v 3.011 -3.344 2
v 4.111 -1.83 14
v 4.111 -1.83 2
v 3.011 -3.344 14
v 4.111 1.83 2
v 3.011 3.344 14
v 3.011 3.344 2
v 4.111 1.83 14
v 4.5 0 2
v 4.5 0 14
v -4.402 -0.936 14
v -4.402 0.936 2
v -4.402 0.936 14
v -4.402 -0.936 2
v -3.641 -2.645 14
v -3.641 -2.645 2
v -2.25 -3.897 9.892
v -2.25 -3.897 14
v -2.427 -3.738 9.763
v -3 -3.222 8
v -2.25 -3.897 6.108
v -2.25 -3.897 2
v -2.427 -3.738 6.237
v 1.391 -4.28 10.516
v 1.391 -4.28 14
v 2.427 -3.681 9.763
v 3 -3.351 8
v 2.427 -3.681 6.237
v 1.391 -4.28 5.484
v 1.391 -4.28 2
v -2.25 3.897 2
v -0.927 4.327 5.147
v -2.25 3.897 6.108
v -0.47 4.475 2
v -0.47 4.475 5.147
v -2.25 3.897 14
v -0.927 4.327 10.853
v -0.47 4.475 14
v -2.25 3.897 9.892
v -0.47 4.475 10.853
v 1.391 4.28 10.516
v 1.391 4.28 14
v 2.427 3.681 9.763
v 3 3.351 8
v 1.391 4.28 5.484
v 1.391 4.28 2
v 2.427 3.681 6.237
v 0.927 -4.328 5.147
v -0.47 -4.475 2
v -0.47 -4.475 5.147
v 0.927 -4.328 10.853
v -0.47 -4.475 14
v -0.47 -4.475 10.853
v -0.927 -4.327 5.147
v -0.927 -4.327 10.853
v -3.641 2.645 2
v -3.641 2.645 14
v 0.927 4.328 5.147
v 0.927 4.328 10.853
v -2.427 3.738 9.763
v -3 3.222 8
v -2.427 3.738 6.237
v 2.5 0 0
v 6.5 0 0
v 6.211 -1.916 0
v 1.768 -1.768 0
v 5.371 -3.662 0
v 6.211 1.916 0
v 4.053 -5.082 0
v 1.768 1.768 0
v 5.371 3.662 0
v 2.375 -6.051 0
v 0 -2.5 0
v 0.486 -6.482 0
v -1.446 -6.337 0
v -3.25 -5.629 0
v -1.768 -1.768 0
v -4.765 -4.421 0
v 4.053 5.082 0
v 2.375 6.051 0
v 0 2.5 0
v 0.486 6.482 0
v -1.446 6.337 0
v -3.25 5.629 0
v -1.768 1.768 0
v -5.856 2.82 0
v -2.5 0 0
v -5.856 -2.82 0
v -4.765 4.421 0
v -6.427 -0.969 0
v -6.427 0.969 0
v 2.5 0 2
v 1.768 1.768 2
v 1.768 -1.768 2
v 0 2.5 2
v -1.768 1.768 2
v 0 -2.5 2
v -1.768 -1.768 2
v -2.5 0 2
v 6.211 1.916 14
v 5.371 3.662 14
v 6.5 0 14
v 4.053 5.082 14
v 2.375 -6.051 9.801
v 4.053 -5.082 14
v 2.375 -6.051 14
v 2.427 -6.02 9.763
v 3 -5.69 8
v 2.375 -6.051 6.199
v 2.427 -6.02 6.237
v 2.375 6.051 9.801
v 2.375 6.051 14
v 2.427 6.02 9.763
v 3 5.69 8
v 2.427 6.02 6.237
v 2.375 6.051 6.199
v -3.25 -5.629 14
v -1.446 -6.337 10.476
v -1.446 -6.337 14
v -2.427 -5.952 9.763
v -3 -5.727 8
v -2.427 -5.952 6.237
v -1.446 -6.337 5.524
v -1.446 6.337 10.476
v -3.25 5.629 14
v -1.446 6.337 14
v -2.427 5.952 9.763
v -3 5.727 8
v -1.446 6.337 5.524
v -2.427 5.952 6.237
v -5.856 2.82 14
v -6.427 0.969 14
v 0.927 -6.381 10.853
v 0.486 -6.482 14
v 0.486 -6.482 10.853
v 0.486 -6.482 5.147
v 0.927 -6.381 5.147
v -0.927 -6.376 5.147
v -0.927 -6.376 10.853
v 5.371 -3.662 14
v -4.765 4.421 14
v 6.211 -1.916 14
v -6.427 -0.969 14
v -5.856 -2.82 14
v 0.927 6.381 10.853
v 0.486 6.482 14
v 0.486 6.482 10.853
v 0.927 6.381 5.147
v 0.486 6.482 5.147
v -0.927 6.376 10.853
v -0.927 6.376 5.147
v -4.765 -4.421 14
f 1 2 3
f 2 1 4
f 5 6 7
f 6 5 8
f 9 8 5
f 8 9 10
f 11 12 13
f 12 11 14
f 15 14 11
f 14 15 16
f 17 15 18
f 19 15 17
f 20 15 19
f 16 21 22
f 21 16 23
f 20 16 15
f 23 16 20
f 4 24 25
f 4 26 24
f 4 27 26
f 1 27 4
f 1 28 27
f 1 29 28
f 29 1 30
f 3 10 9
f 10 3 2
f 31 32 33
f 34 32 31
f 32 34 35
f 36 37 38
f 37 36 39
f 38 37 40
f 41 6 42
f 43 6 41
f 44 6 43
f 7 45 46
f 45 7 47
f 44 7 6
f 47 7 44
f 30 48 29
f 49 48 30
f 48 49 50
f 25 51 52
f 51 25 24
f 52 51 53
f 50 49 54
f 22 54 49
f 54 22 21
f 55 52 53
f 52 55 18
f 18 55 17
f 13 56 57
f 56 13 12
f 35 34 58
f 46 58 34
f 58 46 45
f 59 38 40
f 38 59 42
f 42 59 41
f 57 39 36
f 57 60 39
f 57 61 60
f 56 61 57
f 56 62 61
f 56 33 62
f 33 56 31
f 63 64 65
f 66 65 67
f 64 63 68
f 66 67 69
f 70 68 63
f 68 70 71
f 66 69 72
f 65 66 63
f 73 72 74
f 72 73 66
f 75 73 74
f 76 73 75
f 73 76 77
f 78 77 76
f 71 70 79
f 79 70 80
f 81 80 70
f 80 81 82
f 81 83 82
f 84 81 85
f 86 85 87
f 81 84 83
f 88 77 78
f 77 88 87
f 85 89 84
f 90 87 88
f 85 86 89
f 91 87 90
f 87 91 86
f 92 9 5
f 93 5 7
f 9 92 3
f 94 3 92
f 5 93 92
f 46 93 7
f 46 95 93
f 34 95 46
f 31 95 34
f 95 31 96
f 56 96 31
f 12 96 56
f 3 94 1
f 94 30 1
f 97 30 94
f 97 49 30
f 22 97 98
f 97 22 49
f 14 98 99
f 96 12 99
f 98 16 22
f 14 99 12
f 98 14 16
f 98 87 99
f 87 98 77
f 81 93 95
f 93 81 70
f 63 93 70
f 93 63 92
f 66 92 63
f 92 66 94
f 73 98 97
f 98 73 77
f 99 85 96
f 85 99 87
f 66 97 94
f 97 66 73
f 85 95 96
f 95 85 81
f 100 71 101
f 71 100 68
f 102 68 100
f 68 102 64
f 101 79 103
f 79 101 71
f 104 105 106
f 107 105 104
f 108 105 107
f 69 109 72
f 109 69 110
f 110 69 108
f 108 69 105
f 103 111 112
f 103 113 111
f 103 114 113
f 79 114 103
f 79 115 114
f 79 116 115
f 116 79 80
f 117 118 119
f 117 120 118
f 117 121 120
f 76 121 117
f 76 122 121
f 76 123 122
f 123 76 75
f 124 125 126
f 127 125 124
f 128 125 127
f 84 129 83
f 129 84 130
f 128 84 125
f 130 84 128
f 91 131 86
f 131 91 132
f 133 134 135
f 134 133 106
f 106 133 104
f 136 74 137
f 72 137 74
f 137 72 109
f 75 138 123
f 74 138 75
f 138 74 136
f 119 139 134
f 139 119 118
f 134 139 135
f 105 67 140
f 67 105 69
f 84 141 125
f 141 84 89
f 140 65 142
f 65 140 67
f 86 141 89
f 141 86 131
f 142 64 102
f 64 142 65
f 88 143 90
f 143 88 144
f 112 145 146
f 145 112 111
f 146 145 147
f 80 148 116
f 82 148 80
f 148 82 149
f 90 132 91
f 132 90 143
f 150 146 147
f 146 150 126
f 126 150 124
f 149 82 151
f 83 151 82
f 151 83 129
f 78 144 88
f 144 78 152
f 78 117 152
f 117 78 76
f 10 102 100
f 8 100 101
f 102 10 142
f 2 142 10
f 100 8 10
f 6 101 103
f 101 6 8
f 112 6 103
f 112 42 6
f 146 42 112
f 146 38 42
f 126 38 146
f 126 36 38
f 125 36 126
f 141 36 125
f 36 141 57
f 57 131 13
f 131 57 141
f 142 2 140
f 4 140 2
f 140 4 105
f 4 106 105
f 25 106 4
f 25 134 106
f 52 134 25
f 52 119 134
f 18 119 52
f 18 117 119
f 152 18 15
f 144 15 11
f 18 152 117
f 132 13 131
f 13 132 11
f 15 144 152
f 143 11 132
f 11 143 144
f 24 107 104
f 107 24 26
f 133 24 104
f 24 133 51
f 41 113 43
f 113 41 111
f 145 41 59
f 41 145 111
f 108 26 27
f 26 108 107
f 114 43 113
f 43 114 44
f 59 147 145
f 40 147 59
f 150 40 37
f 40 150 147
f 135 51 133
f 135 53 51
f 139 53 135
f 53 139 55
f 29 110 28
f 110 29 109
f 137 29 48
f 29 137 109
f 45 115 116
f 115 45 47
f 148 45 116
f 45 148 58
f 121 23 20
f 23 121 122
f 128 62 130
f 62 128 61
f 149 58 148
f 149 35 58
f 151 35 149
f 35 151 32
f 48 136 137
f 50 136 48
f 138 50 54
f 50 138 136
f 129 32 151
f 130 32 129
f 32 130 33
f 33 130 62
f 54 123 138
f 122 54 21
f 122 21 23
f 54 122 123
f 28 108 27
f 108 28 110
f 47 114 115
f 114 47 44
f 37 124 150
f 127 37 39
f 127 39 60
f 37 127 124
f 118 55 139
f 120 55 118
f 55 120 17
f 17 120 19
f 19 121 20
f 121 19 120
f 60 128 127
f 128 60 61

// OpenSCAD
difference() {
	union() {
		difference() {
			cylinder(d = 9, h = 2);
			translate(v = [0, 0, -2]) {
				cylinder(d = 5, h = 4);
			}
		}
		difference() {
			cylinder(d = 13, h = 14);
			translate(v = [0, 0, -14]) {
				cylinder(d = 9, h = 28);
			}
		}
	}
	translate(v = [0, 0, 8]) {
		translate(v = [0, 15.0000000000, 0]) {
			rotate(a = [90, 0, 0]) {
				cylinder(d = 6, h = 30);
			}
		}
	}
}
